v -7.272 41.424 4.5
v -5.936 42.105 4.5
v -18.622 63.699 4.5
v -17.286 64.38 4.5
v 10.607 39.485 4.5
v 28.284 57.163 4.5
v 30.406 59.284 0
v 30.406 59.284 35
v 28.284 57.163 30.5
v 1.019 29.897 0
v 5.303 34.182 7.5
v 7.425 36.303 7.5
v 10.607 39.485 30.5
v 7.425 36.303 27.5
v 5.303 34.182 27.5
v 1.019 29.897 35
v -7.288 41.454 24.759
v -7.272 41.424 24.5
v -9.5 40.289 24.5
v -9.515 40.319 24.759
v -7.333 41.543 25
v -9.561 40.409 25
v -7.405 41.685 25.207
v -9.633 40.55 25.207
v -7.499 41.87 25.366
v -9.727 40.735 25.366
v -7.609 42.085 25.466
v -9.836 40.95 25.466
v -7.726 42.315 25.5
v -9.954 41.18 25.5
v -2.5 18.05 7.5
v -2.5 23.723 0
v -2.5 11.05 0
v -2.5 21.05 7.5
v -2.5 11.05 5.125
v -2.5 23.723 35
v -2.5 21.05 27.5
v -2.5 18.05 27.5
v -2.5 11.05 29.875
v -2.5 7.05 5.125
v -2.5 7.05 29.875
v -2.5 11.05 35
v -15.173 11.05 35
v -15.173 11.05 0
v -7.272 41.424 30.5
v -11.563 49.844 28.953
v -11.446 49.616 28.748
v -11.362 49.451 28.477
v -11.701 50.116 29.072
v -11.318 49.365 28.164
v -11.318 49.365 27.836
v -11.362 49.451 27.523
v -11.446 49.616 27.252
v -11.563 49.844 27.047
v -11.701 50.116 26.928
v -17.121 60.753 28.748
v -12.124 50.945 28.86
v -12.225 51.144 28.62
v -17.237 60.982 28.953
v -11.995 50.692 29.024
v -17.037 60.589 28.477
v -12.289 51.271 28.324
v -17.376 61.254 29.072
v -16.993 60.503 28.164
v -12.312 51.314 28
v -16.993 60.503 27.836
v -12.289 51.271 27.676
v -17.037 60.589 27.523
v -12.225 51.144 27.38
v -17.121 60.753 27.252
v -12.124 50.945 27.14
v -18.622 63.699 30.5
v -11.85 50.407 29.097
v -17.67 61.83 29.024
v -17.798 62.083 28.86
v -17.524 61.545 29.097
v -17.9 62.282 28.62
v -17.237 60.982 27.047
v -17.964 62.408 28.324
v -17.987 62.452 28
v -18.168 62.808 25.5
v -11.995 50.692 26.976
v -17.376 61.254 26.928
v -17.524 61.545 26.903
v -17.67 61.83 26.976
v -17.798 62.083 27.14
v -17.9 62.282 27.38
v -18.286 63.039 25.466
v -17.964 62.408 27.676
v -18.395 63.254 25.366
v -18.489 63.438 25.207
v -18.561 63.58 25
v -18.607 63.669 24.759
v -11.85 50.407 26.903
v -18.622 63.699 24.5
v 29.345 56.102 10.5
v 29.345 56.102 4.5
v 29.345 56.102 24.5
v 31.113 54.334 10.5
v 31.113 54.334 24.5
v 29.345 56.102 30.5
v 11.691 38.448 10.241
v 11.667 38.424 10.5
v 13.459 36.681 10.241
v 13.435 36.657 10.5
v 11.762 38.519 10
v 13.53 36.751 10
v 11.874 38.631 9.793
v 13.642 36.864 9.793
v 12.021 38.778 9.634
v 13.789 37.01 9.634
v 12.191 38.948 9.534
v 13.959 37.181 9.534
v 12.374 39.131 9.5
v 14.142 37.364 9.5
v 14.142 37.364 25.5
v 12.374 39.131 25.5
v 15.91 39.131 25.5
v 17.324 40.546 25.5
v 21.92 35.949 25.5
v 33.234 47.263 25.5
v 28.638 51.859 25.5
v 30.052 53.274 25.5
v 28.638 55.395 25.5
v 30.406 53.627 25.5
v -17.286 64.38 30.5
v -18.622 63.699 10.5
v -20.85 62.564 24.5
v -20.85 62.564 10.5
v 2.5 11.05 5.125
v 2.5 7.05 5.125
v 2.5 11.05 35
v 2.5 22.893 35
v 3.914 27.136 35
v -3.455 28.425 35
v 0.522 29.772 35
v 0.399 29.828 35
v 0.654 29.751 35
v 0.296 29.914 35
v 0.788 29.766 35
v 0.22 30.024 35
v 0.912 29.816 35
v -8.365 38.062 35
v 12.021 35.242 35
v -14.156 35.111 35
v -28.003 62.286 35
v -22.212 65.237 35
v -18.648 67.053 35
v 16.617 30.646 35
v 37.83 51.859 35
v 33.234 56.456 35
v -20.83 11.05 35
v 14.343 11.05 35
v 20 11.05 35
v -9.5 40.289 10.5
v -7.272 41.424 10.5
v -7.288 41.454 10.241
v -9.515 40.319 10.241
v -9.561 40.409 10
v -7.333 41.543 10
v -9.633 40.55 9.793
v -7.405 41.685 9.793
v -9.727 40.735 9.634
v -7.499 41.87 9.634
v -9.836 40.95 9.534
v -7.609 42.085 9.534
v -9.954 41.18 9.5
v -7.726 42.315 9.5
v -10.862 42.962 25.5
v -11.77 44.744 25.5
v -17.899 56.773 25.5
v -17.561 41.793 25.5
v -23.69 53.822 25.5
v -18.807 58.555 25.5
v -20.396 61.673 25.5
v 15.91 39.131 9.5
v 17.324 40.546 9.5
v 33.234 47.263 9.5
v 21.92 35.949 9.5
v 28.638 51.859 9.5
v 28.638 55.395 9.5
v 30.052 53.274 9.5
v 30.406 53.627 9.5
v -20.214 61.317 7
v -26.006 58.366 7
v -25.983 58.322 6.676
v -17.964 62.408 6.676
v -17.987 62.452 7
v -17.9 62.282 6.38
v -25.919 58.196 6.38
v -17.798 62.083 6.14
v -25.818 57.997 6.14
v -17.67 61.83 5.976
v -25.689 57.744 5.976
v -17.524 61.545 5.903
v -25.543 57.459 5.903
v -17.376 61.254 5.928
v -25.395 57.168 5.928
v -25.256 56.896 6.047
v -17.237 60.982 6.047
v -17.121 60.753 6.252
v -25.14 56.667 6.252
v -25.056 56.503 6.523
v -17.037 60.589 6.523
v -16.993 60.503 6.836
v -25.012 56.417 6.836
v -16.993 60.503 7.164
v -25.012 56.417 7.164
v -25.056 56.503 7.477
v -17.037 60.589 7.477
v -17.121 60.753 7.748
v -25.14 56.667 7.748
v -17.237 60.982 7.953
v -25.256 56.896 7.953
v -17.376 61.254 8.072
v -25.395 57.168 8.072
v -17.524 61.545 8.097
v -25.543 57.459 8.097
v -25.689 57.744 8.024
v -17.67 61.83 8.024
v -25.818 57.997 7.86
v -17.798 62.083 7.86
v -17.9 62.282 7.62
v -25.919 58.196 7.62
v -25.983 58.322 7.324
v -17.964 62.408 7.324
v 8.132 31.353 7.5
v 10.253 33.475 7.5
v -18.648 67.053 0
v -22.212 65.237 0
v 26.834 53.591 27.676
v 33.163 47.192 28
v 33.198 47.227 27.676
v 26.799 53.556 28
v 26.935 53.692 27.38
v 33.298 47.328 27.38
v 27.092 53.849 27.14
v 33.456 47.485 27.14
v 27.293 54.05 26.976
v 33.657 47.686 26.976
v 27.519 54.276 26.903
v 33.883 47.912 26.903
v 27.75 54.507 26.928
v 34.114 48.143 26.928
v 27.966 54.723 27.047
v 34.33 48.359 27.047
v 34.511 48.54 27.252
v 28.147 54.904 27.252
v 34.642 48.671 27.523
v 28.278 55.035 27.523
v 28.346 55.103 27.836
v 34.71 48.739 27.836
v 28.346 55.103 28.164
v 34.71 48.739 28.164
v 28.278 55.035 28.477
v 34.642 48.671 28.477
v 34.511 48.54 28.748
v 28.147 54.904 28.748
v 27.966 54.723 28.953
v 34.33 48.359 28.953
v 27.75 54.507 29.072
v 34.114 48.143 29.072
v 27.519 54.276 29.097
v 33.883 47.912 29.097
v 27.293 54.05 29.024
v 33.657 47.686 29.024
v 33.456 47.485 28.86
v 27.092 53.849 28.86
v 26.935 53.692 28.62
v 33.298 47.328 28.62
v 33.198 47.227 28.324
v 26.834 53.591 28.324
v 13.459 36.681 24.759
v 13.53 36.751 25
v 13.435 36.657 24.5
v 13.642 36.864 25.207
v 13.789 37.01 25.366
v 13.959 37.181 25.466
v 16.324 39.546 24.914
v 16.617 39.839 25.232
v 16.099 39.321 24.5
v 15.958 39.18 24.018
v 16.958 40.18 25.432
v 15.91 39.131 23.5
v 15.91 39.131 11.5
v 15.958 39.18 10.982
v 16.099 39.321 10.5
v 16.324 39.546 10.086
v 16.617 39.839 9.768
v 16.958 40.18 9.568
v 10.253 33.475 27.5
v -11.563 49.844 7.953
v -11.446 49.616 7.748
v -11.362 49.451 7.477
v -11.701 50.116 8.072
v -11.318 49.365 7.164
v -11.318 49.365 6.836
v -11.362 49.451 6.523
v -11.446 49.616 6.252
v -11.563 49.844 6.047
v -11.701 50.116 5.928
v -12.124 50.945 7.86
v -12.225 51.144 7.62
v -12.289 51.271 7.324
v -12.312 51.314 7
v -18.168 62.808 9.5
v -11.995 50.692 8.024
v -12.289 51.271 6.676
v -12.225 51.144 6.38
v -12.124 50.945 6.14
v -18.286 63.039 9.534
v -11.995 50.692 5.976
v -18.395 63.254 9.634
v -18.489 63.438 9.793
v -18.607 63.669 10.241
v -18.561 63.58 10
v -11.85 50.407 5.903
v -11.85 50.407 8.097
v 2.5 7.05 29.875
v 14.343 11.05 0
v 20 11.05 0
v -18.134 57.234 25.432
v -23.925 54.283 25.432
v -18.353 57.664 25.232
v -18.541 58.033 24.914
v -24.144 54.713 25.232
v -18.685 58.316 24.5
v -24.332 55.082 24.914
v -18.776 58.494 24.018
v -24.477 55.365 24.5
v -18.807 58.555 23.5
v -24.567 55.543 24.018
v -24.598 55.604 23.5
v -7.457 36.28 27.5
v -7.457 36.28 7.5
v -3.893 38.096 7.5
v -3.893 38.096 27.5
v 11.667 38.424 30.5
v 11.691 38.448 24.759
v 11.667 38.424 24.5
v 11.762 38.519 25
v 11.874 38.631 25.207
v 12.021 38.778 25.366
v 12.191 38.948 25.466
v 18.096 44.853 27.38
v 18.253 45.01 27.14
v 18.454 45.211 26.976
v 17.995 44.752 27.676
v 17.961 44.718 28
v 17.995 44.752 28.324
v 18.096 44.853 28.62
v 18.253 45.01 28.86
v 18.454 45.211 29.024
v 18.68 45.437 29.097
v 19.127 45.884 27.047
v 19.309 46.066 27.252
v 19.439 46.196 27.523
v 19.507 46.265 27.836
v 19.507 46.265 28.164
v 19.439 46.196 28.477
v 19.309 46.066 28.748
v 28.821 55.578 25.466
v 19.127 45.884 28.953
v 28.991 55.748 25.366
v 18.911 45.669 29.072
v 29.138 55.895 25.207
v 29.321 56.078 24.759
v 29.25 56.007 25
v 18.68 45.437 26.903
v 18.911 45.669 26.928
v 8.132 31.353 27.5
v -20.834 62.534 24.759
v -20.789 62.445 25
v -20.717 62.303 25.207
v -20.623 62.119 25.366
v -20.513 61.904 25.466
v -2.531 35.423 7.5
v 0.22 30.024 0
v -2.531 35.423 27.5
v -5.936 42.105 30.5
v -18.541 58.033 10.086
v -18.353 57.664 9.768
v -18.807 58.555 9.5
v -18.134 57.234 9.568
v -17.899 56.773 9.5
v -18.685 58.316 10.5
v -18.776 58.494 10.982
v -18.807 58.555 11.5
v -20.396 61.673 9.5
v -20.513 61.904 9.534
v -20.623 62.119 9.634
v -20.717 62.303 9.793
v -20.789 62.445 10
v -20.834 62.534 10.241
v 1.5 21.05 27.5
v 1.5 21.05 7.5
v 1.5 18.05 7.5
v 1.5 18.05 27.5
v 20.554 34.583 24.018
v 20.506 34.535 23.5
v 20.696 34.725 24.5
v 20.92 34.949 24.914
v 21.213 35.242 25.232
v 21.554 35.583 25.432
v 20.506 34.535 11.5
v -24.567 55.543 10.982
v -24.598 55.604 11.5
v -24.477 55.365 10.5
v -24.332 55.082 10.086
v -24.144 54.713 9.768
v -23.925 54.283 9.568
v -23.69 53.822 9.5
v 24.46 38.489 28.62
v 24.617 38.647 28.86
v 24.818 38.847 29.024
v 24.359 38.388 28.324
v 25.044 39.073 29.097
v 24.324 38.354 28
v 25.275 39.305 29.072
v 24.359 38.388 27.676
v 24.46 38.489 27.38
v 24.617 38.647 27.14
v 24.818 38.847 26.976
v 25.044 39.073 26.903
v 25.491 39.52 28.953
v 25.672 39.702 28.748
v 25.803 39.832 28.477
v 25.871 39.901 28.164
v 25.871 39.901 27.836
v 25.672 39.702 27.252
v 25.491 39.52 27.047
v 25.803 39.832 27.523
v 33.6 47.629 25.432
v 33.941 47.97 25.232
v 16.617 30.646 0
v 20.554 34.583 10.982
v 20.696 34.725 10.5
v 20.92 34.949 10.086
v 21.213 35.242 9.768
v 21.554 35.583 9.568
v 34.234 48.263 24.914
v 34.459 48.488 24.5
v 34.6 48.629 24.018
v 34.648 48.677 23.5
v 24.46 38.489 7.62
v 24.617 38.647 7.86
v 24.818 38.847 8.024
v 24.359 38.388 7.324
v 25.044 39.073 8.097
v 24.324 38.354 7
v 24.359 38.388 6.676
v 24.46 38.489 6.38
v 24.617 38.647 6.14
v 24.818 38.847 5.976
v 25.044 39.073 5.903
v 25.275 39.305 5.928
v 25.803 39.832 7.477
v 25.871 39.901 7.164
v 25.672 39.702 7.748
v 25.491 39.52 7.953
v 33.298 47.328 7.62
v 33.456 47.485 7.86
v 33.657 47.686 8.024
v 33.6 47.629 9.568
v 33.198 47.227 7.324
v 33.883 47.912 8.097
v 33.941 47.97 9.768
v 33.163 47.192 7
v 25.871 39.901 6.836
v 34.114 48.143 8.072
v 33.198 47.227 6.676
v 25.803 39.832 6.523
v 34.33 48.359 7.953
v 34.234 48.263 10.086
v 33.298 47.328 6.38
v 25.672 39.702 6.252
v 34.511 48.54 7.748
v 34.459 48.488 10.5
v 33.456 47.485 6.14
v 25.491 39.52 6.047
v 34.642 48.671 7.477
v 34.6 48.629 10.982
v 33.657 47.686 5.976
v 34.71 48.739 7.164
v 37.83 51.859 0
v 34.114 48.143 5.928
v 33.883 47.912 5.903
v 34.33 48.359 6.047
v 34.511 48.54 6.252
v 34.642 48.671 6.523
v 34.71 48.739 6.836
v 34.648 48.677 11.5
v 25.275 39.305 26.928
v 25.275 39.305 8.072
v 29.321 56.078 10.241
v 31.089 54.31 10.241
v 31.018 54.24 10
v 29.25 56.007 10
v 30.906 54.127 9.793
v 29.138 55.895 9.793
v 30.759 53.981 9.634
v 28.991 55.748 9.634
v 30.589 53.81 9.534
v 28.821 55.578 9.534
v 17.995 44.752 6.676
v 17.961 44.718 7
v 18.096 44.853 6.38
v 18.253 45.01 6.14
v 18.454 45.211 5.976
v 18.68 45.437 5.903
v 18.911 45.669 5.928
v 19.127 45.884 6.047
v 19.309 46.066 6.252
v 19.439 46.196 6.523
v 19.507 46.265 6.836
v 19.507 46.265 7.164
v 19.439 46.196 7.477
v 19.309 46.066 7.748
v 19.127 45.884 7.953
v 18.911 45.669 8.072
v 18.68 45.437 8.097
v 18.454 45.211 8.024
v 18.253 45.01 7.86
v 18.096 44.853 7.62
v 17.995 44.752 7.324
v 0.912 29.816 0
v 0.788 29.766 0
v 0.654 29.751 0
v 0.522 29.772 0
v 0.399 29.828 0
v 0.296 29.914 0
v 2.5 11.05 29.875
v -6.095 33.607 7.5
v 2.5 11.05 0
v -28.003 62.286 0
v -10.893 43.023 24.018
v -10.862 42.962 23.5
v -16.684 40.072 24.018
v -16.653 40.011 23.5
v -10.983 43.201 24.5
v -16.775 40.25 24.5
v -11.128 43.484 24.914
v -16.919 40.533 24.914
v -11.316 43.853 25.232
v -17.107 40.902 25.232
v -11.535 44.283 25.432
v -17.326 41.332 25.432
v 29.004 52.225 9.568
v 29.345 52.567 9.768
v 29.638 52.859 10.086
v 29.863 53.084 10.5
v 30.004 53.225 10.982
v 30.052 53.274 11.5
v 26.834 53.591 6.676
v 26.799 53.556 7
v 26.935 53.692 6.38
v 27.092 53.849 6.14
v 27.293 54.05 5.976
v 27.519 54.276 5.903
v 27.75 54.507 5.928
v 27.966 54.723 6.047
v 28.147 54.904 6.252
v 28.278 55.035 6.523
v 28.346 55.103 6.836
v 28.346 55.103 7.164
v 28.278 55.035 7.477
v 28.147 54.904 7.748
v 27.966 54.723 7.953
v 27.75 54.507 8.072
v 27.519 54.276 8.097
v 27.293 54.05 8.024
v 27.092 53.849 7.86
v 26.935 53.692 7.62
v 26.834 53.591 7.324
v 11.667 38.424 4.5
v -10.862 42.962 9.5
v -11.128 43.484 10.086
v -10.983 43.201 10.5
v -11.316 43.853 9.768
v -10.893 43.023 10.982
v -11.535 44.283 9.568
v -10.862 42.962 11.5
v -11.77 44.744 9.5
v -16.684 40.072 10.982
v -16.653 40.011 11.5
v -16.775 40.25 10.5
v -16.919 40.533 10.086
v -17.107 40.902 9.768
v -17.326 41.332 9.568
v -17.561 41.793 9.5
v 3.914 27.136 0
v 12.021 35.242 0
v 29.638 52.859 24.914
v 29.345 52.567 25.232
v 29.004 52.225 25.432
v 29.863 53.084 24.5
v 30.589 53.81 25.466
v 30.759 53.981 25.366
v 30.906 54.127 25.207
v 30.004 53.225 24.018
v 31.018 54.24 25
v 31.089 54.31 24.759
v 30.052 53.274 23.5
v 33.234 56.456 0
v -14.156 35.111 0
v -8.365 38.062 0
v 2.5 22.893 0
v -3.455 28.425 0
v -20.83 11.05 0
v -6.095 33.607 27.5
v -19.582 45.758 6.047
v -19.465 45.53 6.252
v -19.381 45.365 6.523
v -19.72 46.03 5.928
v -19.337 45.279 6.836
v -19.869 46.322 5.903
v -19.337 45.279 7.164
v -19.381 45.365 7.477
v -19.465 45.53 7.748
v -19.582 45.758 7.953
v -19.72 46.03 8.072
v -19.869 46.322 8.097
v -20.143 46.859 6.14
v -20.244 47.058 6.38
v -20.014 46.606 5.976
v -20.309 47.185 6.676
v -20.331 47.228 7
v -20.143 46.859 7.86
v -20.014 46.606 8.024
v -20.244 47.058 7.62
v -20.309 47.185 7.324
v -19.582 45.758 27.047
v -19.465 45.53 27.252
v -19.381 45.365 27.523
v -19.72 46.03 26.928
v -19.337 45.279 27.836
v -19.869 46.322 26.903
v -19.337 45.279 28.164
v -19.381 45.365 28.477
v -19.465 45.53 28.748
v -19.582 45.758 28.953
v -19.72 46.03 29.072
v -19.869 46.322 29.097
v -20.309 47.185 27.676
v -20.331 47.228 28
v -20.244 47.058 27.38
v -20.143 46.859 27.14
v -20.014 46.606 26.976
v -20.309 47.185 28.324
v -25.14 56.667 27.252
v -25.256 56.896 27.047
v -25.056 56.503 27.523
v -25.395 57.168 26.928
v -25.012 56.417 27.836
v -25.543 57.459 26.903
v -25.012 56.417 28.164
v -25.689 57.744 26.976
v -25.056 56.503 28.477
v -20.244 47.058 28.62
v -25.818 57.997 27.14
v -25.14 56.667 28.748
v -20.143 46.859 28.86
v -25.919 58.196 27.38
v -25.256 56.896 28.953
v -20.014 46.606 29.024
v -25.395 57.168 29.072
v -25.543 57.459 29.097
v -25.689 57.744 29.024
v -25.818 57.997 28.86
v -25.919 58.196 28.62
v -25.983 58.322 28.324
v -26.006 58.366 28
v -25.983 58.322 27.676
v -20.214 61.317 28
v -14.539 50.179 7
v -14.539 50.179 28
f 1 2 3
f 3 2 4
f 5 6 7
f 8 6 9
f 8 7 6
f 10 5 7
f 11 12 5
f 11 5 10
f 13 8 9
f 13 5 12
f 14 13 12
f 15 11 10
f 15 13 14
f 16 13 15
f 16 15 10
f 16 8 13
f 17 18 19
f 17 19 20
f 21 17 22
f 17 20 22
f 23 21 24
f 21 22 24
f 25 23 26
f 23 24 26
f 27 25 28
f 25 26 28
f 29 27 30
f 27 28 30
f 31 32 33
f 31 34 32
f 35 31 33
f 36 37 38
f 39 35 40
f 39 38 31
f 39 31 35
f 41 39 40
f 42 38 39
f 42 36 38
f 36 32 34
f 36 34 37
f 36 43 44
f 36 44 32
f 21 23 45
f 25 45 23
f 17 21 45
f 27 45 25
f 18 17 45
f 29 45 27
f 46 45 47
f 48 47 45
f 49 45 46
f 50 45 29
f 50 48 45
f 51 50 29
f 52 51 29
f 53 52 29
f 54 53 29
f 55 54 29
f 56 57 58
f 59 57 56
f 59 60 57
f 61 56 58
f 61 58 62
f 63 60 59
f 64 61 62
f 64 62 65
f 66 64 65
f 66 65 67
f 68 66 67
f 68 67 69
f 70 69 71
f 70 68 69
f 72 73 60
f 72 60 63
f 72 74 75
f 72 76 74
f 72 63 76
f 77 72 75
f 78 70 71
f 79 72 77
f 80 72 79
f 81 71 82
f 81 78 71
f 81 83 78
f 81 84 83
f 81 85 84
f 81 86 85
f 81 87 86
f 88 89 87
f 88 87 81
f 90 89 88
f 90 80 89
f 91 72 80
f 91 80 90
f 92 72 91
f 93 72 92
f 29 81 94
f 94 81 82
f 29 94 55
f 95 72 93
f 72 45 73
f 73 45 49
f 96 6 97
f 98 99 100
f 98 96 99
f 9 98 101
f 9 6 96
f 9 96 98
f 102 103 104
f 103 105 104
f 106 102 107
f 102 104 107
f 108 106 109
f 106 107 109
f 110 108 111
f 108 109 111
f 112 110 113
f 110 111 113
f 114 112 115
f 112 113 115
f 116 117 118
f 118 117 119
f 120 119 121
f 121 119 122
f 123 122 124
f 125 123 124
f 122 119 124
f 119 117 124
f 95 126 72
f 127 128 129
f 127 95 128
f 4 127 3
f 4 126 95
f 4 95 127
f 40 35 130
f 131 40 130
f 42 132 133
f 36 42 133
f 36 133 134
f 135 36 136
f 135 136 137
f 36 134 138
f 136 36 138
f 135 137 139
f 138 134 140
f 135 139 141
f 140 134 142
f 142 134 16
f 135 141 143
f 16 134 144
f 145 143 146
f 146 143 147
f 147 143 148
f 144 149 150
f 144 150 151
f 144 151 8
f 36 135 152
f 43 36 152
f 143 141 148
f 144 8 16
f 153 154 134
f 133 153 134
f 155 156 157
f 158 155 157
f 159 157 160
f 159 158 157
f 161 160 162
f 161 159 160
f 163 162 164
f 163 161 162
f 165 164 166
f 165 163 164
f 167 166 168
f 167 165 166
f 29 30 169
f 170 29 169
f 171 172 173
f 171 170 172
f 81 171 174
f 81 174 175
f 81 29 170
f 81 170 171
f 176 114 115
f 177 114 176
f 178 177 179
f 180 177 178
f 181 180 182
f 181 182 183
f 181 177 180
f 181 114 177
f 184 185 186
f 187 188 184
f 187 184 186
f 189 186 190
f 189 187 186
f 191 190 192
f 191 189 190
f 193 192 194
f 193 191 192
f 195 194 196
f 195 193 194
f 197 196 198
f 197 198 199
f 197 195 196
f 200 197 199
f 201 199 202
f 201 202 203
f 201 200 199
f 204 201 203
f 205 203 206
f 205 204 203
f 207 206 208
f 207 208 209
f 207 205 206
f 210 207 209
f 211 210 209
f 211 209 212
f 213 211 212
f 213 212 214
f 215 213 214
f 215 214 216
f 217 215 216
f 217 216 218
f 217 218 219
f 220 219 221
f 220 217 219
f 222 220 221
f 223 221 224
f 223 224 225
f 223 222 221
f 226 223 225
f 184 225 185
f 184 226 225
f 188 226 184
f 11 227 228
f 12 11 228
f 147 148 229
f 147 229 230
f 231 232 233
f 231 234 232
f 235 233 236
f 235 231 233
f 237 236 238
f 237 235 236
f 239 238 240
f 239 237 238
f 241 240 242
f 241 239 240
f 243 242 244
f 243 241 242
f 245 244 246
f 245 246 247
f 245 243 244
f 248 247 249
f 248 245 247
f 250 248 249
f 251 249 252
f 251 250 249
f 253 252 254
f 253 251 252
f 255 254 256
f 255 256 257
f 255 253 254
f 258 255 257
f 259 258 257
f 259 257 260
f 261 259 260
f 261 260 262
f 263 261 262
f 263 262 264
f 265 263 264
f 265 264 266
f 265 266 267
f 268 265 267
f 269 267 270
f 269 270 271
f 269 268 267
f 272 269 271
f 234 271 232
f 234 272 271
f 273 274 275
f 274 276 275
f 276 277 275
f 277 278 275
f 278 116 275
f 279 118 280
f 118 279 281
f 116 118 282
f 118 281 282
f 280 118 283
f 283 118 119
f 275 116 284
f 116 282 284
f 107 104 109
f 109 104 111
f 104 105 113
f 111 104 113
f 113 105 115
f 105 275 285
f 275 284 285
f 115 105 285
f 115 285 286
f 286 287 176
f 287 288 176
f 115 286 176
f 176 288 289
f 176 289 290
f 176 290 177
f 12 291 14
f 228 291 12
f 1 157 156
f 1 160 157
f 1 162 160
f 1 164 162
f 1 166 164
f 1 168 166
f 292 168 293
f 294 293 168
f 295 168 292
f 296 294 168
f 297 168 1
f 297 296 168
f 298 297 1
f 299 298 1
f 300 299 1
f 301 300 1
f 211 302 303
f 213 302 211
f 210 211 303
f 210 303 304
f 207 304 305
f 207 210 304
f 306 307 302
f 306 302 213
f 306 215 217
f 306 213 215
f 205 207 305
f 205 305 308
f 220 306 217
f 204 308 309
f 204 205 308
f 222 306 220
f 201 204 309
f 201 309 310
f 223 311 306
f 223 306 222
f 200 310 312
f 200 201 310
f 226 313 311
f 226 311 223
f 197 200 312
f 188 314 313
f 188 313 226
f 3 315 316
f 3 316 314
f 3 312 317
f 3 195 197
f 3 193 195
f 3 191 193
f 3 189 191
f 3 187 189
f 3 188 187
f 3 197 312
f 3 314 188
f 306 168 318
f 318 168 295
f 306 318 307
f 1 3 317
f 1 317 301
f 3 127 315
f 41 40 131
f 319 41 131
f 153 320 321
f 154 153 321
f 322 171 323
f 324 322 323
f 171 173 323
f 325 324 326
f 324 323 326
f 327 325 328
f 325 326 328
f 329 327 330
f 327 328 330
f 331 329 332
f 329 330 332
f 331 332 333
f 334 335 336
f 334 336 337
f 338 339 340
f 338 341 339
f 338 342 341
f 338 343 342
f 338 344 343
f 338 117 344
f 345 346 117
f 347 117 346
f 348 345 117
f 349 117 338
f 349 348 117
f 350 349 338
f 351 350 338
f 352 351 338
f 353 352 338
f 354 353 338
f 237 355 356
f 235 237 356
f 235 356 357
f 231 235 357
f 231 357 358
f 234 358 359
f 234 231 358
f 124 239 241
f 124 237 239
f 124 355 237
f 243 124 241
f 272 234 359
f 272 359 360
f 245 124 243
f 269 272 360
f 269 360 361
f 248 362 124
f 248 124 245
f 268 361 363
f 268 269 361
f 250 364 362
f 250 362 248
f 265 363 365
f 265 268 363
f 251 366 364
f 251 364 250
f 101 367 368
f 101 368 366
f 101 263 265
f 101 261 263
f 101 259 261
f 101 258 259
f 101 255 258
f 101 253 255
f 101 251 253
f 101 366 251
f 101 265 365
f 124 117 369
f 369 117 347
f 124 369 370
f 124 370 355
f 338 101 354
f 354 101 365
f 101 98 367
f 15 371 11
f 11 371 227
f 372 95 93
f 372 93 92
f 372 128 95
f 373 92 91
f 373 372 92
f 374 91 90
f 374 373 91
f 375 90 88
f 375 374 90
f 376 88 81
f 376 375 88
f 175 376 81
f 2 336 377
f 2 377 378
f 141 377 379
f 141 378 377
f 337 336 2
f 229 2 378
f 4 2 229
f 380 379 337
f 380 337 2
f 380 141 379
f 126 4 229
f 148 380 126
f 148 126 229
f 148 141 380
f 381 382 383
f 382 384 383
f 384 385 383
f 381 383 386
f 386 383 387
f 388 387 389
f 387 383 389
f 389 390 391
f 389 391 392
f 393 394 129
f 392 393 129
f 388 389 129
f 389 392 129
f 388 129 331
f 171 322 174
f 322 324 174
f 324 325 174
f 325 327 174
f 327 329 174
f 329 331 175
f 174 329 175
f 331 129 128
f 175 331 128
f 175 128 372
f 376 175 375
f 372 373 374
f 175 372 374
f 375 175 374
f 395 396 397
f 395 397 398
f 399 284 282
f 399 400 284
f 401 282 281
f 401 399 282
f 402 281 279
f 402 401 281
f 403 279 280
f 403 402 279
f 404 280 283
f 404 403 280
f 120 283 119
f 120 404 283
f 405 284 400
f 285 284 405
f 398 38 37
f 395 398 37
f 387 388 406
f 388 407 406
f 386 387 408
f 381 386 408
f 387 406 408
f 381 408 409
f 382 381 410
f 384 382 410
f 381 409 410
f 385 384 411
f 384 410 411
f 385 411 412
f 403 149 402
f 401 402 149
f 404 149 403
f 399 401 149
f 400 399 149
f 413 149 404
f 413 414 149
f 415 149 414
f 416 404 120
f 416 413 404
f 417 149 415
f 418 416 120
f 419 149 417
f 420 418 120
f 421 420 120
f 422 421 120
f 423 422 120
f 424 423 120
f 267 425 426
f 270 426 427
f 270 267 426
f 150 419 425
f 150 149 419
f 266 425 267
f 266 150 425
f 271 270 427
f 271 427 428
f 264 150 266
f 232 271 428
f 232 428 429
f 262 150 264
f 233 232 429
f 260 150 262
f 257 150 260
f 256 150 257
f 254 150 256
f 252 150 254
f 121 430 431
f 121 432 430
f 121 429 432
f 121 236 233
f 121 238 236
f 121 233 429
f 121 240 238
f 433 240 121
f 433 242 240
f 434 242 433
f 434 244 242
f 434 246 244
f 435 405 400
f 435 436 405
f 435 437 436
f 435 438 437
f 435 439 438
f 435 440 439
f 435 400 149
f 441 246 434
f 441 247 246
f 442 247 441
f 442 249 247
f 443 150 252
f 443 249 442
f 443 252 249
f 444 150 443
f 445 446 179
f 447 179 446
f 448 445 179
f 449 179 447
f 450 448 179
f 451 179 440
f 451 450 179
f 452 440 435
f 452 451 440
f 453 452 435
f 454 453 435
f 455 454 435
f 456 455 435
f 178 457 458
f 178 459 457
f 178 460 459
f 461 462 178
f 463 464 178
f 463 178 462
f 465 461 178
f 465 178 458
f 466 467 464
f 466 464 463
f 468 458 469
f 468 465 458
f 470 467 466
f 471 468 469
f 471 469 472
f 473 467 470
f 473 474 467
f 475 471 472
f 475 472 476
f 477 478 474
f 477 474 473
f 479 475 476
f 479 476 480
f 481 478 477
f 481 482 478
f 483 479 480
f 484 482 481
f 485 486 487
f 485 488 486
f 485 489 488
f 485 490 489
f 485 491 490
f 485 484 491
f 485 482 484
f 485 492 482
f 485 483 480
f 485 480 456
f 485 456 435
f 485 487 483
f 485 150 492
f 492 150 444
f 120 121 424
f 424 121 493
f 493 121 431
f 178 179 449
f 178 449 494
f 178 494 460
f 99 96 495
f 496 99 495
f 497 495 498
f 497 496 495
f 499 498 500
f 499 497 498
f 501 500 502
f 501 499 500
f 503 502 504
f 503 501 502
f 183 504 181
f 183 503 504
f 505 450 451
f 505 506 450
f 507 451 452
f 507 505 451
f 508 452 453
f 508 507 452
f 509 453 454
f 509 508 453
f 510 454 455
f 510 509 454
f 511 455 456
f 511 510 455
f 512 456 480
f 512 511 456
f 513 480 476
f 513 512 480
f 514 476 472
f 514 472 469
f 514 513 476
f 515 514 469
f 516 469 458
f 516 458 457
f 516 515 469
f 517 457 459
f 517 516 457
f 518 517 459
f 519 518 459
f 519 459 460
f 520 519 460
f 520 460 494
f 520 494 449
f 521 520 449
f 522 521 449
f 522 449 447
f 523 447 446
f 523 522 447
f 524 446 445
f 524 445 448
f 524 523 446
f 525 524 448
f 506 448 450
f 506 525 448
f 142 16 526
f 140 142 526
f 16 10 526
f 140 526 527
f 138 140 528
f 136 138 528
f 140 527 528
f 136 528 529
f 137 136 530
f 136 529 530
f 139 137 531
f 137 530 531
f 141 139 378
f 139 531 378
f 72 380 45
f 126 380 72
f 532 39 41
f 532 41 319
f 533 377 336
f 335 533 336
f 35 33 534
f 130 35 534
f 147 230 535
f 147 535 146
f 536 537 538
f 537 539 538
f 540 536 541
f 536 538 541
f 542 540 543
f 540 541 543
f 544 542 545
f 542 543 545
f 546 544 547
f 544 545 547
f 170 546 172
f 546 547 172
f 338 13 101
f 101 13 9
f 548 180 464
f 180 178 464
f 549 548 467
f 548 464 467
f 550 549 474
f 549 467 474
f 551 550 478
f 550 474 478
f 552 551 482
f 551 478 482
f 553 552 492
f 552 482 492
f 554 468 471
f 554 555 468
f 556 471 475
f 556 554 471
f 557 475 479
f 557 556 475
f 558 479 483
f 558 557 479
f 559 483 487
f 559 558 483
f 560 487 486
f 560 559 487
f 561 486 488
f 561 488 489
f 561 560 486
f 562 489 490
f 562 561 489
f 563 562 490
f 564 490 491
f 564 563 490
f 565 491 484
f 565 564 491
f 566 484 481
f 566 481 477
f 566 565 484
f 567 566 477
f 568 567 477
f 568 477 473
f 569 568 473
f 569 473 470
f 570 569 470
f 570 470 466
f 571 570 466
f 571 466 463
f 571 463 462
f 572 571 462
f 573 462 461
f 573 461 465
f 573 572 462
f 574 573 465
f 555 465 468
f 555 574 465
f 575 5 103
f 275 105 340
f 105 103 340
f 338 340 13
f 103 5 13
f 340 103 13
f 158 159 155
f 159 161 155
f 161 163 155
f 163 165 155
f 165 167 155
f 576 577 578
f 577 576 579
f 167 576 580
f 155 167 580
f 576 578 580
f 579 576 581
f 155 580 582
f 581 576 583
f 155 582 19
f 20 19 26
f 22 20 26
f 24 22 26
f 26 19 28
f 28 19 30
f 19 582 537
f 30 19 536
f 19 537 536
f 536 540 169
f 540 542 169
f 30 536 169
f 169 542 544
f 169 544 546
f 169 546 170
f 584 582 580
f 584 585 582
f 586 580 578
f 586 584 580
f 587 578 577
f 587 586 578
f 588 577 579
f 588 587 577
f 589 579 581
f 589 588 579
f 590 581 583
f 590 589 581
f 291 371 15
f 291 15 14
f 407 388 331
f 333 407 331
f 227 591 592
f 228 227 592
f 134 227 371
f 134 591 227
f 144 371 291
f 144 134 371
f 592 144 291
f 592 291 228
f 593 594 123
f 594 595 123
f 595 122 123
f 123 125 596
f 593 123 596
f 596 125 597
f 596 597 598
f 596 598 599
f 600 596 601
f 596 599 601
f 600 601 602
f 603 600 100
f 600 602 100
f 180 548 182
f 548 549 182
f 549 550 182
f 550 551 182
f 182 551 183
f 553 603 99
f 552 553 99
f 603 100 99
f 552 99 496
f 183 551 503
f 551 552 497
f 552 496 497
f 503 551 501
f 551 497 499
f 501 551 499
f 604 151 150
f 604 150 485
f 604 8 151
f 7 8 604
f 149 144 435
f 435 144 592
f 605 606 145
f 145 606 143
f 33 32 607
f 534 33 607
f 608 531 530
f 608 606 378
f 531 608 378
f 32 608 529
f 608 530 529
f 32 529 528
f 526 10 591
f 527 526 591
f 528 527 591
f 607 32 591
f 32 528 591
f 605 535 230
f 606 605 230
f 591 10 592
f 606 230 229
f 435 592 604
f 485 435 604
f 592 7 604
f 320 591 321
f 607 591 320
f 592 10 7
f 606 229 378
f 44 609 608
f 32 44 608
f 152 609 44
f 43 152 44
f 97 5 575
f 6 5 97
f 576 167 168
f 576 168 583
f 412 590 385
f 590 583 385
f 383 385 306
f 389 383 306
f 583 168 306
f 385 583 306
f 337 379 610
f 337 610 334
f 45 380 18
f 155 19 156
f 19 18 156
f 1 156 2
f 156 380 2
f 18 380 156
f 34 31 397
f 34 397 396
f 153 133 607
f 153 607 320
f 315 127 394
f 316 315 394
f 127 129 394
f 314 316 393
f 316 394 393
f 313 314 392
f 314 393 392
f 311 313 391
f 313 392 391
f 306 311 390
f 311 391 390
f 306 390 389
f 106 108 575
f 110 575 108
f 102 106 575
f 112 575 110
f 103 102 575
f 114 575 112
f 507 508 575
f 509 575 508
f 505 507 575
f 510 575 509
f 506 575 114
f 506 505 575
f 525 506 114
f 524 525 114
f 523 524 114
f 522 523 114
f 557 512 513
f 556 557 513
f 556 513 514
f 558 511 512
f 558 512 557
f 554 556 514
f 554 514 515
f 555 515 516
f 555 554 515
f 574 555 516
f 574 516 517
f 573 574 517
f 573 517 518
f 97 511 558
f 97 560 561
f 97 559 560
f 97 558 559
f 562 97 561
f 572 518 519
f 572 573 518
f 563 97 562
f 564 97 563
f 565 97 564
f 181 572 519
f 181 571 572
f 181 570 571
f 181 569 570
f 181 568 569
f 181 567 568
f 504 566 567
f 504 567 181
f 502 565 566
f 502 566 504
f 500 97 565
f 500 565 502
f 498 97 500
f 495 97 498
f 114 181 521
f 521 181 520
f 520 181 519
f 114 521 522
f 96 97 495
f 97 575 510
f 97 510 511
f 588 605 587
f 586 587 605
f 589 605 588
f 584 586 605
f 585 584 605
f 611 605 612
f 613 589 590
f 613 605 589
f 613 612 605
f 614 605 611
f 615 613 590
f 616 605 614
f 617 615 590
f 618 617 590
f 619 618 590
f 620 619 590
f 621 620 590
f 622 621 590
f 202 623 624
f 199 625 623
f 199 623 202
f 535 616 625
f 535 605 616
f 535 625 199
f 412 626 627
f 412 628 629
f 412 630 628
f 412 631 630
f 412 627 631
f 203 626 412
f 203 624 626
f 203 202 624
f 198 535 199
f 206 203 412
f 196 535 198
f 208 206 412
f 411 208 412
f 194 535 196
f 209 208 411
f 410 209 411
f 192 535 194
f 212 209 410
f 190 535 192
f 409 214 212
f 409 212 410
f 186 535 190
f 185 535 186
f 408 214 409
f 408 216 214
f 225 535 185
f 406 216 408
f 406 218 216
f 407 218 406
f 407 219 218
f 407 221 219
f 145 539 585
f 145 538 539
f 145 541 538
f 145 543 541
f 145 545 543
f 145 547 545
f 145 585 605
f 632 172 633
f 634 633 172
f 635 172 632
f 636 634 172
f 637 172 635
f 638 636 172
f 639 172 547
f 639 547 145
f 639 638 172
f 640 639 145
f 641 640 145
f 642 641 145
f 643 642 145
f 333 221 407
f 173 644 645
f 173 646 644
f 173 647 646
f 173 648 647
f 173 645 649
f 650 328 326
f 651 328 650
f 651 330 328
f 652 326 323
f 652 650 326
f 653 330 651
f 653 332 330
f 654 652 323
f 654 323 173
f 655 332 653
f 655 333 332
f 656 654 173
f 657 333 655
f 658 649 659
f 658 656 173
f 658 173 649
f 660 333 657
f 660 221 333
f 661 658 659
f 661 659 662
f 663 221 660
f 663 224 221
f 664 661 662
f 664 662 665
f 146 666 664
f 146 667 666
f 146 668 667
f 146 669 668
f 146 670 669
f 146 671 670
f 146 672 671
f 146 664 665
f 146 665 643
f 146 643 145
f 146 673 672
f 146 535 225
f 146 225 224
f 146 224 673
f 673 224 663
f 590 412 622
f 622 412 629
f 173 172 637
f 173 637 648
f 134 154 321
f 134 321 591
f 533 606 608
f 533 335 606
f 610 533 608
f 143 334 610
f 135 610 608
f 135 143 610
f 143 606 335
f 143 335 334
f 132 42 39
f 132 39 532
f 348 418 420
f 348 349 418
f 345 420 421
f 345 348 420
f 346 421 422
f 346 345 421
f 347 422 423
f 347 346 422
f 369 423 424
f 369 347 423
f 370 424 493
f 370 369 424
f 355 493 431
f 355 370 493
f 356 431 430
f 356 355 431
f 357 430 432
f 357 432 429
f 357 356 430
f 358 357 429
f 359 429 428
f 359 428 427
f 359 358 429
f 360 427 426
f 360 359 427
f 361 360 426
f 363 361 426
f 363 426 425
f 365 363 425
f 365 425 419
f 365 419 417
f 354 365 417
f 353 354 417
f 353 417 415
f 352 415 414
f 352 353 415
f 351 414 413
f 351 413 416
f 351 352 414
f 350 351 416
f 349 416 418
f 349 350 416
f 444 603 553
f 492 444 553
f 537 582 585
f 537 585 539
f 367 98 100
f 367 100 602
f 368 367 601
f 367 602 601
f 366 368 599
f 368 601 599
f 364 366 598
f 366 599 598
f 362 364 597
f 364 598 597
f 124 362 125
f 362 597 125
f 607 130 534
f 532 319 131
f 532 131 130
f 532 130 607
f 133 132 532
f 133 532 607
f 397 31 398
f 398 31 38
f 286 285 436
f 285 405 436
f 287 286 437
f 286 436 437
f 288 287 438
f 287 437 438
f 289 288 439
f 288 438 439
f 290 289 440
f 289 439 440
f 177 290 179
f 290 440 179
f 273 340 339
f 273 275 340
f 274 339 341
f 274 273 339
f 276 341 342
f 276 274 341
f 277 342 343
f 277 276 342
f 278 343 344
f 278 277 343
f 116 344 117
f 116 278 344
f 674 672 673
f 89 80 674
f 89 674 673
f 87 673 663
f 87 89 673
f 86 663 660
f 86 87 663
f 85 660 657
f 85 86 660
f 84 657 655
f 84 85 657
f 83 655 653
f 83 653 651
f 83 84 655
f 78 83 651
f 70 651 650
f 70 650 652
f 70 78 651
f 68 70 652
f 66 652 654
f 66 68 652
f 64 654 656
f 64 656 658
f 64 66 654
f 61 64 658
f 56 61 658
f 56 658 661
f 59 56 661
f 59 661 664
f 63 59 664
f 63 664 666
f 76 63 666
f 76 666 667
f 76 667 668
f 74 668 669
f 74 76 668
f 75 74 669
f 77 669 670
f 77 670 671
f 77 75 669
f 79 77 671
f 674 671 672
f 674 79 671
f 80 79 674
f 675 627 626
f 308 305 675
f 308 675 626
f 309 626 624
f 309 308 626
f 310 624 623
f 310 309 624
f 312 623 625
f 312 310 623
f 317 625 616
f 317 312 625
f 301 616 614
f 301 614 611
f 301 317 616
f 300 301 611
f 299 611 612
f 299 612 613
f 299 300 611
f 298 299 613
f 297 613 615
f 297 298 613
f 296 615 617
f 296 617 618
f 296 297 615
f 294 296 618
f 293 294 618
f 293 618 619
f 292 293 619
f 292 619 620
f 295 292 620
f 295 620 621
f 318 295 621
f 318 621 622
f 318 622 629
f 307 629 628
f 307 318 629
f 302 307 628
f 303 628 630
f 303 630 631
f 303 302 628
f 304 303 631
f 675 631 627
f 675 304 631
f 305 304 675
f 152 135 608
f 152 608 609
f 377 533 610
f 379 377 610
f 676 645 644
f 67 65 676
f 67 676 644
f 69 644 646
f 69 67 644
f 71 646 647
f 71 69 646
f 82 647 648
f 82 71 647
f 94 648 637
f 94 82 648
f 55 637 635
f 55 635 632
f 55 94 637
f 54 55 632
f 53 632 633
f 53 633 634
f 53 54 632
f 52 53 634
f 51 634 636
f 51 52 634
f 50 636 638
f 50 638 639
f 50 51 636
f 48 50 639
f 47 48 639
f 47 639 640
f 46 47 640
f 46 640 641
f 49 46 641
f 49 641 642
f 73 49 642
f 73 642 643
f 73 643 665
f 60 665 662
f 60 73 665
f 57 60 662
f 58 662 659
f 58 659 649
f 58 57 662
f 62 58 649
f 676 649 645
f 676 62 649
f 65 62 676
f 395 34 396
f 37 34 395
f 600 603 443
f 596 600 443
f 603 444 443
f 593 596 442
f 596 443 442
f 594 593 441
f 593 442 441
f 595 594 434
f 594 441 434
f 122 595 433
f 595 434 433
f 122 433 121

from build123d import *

# Parameters (mm, degrees)
BOSS_EXTRUDE1_DEPTH      = 35
BOSS_EXTRUDE2_DEPTH      = 35
FILLET1_R                = 0.5
SKETCH3_W                = 26
SKETCH3_H                = 25
CUT_EXTRUDE1_DEPTH       = 1.5
SKETCH4_W                = 16
SKETCH4_H                = 25
CUT_EXTRUDE2_DEPTH       = 5
FILLET3_R                = 1
SKETCH5_W                = 26
SKETCH5_H                = 25
CUT_EXTRUDE3_DEPTH       = 1.5
SKETCH6_W                = 16
SKETCH6_H                = 25
CUT_EXTRUDE4_DEPTH       = 5
FILLET4_R                = 1
SKETCH8_W                = 20
SKETCH8_H                = 3
CUT_EXTRUDE5_DEPTH       = 4
SKETCH9_W                = 20
SKETCH9_H                = 3
CUT_EXTRUDE6_DEPTH       = 4
SKETCH10_W               = 20
SKETCH10_H               = 3
CUT_EXTRUDE7_DEPTH       = 4
SKETCH11_R               = 1.1
CUT_EXTRUDE8_DEPTH       = 10
SKETCH12_R               = 1.1
CUT_EXTRUDE9_DEPTH       = 5
BOSS_EXTRUDE3_DEPTH      = 3.5
BOSS_EXTRUDE3_DEPTH_BACK = 1
SKETCH14_W               = 35
SKETCH14_H               = 3.801557548
SKETCH15_W               = 1.5
SKETCH15_H               = 31
CUT_EXTRUDE10_DEPTH      = 5
SKETCH18_W               = 35
SKETCH18_H               = 30
SKETCH18_R               = 1.1
SKETCH18_W_2             = 16
SKETCH18_H_2             = 20
BOSS_EXTRUDE4_DEPTH      = 6.5
SKETCH19_W               = 35
SKETCH19_H               = 30.5
SKETCH19_R               = 1.1
SKETCH19_W_2             = 16
SKETCH19_H_2             = 17.5
BOSS_EXTRUDE5_DEPTH      = 6.5
CUT_EXTRUDE12_DEPTH      = 2.5
CUT_EXTRUDE12_DEPTH_BACK = 10
SKETCH20_W               = 93.401628658
SKETCH20_H               = 53.255346894
SKETCH21_W               = 5
SKETCH21_H               = 4
CUT_EXTRUDE13_DEPTH      = 5.125
FILLET9_R                = 2
FILLET10_R               = 2
BOSS_EXTRUDE8_DEPTH      = 35


with BuildPart() as part:
    # Sketch1 → Boss-Extrude1 (new body)
    with BuildSketch(Plane.XY):
        Polygon((6.55, 4.55), (-6.55, 4.55), (-6.55, -4.55), (-2.05, -4.55), (-2.05, -2.05), (-4.05, -2.05), (-4.05, 2.05), (4.05, 2.05), (4.05, -2.05), (2.05, -2.05), (2.05, -4.55), (6.55, -4.55), align=None)
    extrude(amount=BOSS_EXTRUDE1_DEPTH)

    # Sketch2 → Boss-Extrude2 (add, through all)
    with BuildSketch(Plane.XY.offset(35)):
        Polygon((2.5, 4.55), (2.5, 25.721572875), (33.234018716, 56.455591591), (30.405591591, 59.284018716), (0.532284417, 29.410711541), (-18.64755944, 67.053274588), (-22.211585537, 65.237312589), (-2.5, 26.551147735), (-2.5, 4.55), align=None)
    extrude(amount=-BOSS_EXTRUDE2_DEPTH)

    # Fillet1
    fillet1_edges = [part.edges().sort_by_distance(p)[0] for p in [
        (0.532284417, 29.410711541, 17.5),
    ]]
    fillet(fillet1_edges, radius=FILLET1_R)

    # Sketch3 → Cut-Extrude1 (cut)
    with BuildSketch(Plane(origin=(-14.439213562, 14.439213562, 0), x_dir=(0, 0, 1), z_dir=(-0.7071067811865464, 0.7071067811865488, 0))):
        with Locations((17.5, 47.92013165)):
            Rectangle(SKETCH3_W, SKETCH3_H)
    extrude(amount=-CUT_EXTRUDE1_DEPTH, mode=Mode.SUBTRACT)

    # Sketch4 → Cut-Extrude2 (cut)
    with BuildSketch(Plane(origin=(-13.378553391, 13.378553391, 0), x_dir=(0, 0, 1), z_dir=(-0.7071067811865461, 0.707106781186549, 0))):
        with Locations((17.5, 47.92013165)):
            Rectangle(SKETCH4_W, SKETCH4_H)
    extrude(amount=-CUT_EXTRUDE2_DEPTH, mode=Mode.SUBTRACT)

    # Fillet3
    fillet3_edges = [part.edges().sort_by_distance(p)[0] for p in [
        (30.228814896, 55.218154724, 9.5),
        (30.228814896, 55.218154724, 25.5),
        (12.551145366, 37.540485194, 25.5),
        (12.551145366, 37.540485194, 9.5),
    ]]
    fillet(fillet3_edges, radius=FILLET3_R)

    # Sketch5 → Cut-Extrude3 (cut)
    with BuildSketch(Plane(origin=(12.3194594, 6.277078088, 0), x_dir=(0, 0, -1), z_dir=(0.8910065241883675, 0.45399049973954786, 0))):
        with Locations((-17.5, 52.710719955)):
            Rectangle(SKETCH5_W, SKETCH5_H)
    extrude(amount=-CUT_EXTRUDE3_DEPTH, mode=Mode.SUBTRACT)

    # Sketch6 → Cut-Extrude4 (cut)
    with BuildSketch(Plane(origin=(10.982949614, 5.596092339, 0), x_dir=(0, 0, -1), z_dir=(0.8910065241883673, 0.4539904997395479, 0))):
        with Locations((-17.5, 52.710719955)):
            Rectangle(SKETCH6_W, SKETCH6_H)
    extrude(amount=-CUT_EXTRUDE4_DEPTH, mode=Mode.SUBTRACT)

    # Fillet4
    fillet4_edges = [part.edges().sort_by_distance(p)[0] for p in [
        (-19.735855882, 63.131781141, 25.5),
        (-19.735855882, 63.131781141, 9.5),
        (-8.386093389, 40.856618036, 9.5),
        (-8.386093389, 40.856618036, 25.5),
    ]]
    fillet(fillet4_edges, radius=FILLET4_R)

    # Sketch8 → Cut-Extrude5 (cut)
    with BuildSketch(Plane(origin=(-11.610786438, 11.610786438, 0), x_dir=(0, 0, -1), z_dir=(0.7071067811865465, -0.7071067811865487, 0))):
        with Locations((-17.5, 29.42013165)):
            Rectangle(SKETCH8_W, SKETCH8_H)
    extrude(amount=-CUT_EXTRUDE5_DEPTH, mode=Mode.SUBTRACT)

    # Sketch9 → Cut-Extrude6 (cut)
    with BuildSketch(Plane(origin=(8.755433303, 4.461116089, 0), x_dir=(0, 0, 1), z_dir=(-0.8910065241883675, -0.45399049973954797, 0))):
        with Locations((17.5, 34.210719955)):
            Rectangle(SKETCH9_W, SKETCH9_H)
    extrude(amount=-CUT_EXTRUDE6_DEPTH, mode=Mode.SUBTRACT)

    # Sketch10 → Cut-Extrude7 (cut)
    with BuildSketch(Plane.ZY.offset(2.5)):
        with Locations((17.5, 19.55)):
            Rectangle(SKETCH10_W, SKETCH10_H)
    extrude(amount=-CUT_EXTRUDE7_DEPTH, mode=Mode.SUBTRACT)

    # Sketch11 → Cut-Extrude8 (cut)
    with BuildSketch(Plane(origin=(-13.378553391, 13.378553391, 0), x_dir=(0, 0, 1), z_dir=(-0.7071067811865461, 0.707106781186549, 0))):
        with Locations(Location((28, 57.92013165, 0), (0, 0, 270))):
            Circle(SKETCH11_R)
        with Locations(Location((7, 57.92013165, 0), (0, 0, 270))):
            Circle(SKETCH11_R)
        with Locations(Location((28, 45.42013165, 0), (0, 0, 270))):
            Circle(SKETCH11_R)
        with Locations(Location((7, 45.42013165, 0), (0, 0, 270))):
            Circle(SKETCH11_R)
    extrude(amount=-CUT_EXTRUDE8_DEPTH, mode=Mode.SUBTRACT)

    # Sketch12 → Cut-Extrude9 (cut)
    with BuildSketch(Plane(origin=(10.982949614, 5.596092339, 0), x_dir=(0, 0, -1), z_dir=(0.8910065241883673, 0.4539904997395479, 0))):
        with Locations(Location((-7, 62.710719955, 0), (0, 0, 90))):
            Circle(SKETCH12_R)
        with Locations(Location((-28, 62.710719955, 0), (0, 0, 90))):
            Circle(SKETCH12_R)
        with Locations(Location((-7, 50.210719955, 0), (0, 0, 90))):
            Circle(SKETCH12_R)
        with Locations(Location((-28, 50.210719955, 0), (0, 0, 90))):
            Circle(SKETCH12_R)
    extrude(amount=-CUT_EXTRUDE9_DEPTH, mode=Mode.SUBTRACT)

    # Sketch14 → Boss-Extrude3 (add, two sides: drawn at the far end of the back side and taken through both)
    with BuildSketch(Plane(origin=(6.55, 0, 0), x_dir=(0, 0, -1), z_dir=(1, 0, 0)).offset(-BOSS_EXTRUDE3_DEPTH_BACK)):
        with Locations((-17.5, -0.05)):
            Rectangle(SKETCH14_W, SKETCH14_H)
    extrude(amount=BOSS_EXTRUDE3_DEPTH + BOSS_EXTRUDE3_DEPTH_BACK)

    # Sketch15 → Cut-Extrude10 (cut)
    with BuildSketch(Plane(origin=(0, 1.850778774, 0), x_dir=(1, 0, 0), z_dir=(0, 1, 0))):
        with Locations((7.3, -17.5)):
            Rectangle(SKETCH15_W, SKETCH15_H)
    extrude(amount=-CUT_EXTRUDE10_DEPTH, mode=Mode.SUBTRACT)

    # Sketch18 → Boss-Extrude4 (add)
    with BuildSketch(Plane(origin=(-11.610786438, 11.610786438, 0), x_dir=(0, 0, -1), z_dir=(0.7071067811865465, -0.7071067811865487, 0))):
        with Locations((-17.5, 48.42013165)):
            Rectangle(SKETCH18_W, SKETCH18_H)
        with Locations(Location((-7, 57.92013165, 0), (0, 0, 270))):
            Circle(SKETCH18_R, mode=Mode.SUBTRACT)
        with Locations(Location((-7, 45.42013165, 0), (0, 0, 270))):
            Circle(SKETCH18_R, mode=Mode.SUBTRACT)
        with Locations(Location((-28, 45.42013165, 0), (0, 0, 270))):
            Circle(SKETCH18_R, mode=Mode.SUBTRACT)
        with Locations(Location((-28, 57.92013165, 0), (0, 0, 270))):
            Circle(SKETCH18_R, mode=Mode.SUBTRACT)
        with Locations((-17.5, 48.92013165)):
            Rectangle(SKETCH18_W_2, SKETCH18_H_2, mode=Mode.SUBTRACT)
    extrude(amount=BOSS_EXTRUDE4_DEPTH)

    # Sketch19 → Boss-Extrude5 (add)
    with BuildSketch(Plane(origin=(8.755433303, 4.461116089, 0), x_dir=(0, 0, 1), z_dir=(-0.8910065241883673, -0.45399049973954797, 0))):
        with Locations((17.5, 52.960719955)):
            Rectangle(SKETCH19_W, SKETCH19_H)
        with Locations(Location((28, 50.210719955, 0), (0, 0, 90))):
            Circle(SKETCH19_R, mode=Mode.SUBTRACT)
        with Locations(Location((7, 50.210719955, 0), (0, 0, 90))):
            Circle(SKETCH19_R, mode=Mode.SUBTRACT)
        with Locations(Location((7, 62.710719955, 0), (0, 0, 90))):
            Circle(SKETCH19_R, mode=Mode.SUBTRACT)
        with Locations(Location((28, 62.710719955, 0), (0, 0, 90))):
            Circle(SKETCH19_R, mode=Mode.SUBTRACT)
        with Locations((17.5, 51.960719955)):
            Rectangle(SKETCH19_W_2, SKETCH19_H_2, mode=Mode.SUBTRACT)
    extrude(amount=BOSS_EXTRUDE5_DEPTH)

    # Sketch20 → Cut-Extrude12 (cut, two sides: drawn at the far end of the back side and taken through both)
    with BuildSketch(Plane(origin=(0, 4.55, 0), x_dir=(1, 0, 0), z_dir=(0, 1, 0)).offset(-CUT_EXTRUDE12_DEPTH_BACK)):
        with Locations((0, -16.396538254)):
            Rectangle(SKETCH20_W, SKETCH20_H)
    extrude(amount=CUT_EXTRUDE12_DEPTH + CUT_EXTRUDE12_DEPTH_BACK, mode=Mode.SUBTRACT)

    # Sketch21 → Cut-Extrude13 (cut)
    with BuildSketch(Plane.XY.offset(35)):
        with Locations((0, 9.05)):
            Rectangle(SKETCH21_W, SKETCH21_H)
    cut_extrude13 = extrude(amount=-CUT_EXTRUDE13_DEPTH, mode=Mode.SUBTRACT)

    # Mirror1: Cut-Extrude13 across plane
    add(cut_extrude13.mirror(Plane(origin=(0, 0, 17.5), x_dir=(1, 0, 0), z_dir=(0, 0, -1))), mode=Mode.SUBTRACT)

    # Fillet9
    fillet9_edges = [part.edges().sort_by_distance(p)[0] for p in [
        (-21.702427992, 57.079294533, 9.5),
        (-13.757594247, 41.48668036, 9.5),
        (-13.757594247, 41.48668036, 25.5),
        (-21.702427992, 57.079294533, 25.5),
    ]]
    fillet(fillet9_edges, radius=FILLET9_R)

    # Fillet10
    fillet10_edges = [part.edges().sort_by_distance(p)[0] for p in [
        (32.350135239, 50.975514037, 25.5),
        (18.207999616, 36.833378413, 25.5),
        (18.207999616, 36.833378413, 9.5),
        (32.350135239, 50.975514037, 9.5),
    ]]
    fillet(fillet10_edges, radius=FILLET10_R)

    # Sketch25 → Boss-Extrude8 (add, through all)
    with BuildSketch(Plane.XY.offset(35)):
        Polygon((1.085786438, 24.307359313), (14.343145751, 11.05), (20, 11.05), (3.093757121, 27.956242879), align=None)
        Polygon((-2.594584578, 29.284990281), (-20.829574859, 11.05), (-15.17272061, 11.05), (-1.085786438, 25.136934172), align=None)
    extrude(amount=-BOSS_EXTRUDE8_DEPTH)


solid = part.part
